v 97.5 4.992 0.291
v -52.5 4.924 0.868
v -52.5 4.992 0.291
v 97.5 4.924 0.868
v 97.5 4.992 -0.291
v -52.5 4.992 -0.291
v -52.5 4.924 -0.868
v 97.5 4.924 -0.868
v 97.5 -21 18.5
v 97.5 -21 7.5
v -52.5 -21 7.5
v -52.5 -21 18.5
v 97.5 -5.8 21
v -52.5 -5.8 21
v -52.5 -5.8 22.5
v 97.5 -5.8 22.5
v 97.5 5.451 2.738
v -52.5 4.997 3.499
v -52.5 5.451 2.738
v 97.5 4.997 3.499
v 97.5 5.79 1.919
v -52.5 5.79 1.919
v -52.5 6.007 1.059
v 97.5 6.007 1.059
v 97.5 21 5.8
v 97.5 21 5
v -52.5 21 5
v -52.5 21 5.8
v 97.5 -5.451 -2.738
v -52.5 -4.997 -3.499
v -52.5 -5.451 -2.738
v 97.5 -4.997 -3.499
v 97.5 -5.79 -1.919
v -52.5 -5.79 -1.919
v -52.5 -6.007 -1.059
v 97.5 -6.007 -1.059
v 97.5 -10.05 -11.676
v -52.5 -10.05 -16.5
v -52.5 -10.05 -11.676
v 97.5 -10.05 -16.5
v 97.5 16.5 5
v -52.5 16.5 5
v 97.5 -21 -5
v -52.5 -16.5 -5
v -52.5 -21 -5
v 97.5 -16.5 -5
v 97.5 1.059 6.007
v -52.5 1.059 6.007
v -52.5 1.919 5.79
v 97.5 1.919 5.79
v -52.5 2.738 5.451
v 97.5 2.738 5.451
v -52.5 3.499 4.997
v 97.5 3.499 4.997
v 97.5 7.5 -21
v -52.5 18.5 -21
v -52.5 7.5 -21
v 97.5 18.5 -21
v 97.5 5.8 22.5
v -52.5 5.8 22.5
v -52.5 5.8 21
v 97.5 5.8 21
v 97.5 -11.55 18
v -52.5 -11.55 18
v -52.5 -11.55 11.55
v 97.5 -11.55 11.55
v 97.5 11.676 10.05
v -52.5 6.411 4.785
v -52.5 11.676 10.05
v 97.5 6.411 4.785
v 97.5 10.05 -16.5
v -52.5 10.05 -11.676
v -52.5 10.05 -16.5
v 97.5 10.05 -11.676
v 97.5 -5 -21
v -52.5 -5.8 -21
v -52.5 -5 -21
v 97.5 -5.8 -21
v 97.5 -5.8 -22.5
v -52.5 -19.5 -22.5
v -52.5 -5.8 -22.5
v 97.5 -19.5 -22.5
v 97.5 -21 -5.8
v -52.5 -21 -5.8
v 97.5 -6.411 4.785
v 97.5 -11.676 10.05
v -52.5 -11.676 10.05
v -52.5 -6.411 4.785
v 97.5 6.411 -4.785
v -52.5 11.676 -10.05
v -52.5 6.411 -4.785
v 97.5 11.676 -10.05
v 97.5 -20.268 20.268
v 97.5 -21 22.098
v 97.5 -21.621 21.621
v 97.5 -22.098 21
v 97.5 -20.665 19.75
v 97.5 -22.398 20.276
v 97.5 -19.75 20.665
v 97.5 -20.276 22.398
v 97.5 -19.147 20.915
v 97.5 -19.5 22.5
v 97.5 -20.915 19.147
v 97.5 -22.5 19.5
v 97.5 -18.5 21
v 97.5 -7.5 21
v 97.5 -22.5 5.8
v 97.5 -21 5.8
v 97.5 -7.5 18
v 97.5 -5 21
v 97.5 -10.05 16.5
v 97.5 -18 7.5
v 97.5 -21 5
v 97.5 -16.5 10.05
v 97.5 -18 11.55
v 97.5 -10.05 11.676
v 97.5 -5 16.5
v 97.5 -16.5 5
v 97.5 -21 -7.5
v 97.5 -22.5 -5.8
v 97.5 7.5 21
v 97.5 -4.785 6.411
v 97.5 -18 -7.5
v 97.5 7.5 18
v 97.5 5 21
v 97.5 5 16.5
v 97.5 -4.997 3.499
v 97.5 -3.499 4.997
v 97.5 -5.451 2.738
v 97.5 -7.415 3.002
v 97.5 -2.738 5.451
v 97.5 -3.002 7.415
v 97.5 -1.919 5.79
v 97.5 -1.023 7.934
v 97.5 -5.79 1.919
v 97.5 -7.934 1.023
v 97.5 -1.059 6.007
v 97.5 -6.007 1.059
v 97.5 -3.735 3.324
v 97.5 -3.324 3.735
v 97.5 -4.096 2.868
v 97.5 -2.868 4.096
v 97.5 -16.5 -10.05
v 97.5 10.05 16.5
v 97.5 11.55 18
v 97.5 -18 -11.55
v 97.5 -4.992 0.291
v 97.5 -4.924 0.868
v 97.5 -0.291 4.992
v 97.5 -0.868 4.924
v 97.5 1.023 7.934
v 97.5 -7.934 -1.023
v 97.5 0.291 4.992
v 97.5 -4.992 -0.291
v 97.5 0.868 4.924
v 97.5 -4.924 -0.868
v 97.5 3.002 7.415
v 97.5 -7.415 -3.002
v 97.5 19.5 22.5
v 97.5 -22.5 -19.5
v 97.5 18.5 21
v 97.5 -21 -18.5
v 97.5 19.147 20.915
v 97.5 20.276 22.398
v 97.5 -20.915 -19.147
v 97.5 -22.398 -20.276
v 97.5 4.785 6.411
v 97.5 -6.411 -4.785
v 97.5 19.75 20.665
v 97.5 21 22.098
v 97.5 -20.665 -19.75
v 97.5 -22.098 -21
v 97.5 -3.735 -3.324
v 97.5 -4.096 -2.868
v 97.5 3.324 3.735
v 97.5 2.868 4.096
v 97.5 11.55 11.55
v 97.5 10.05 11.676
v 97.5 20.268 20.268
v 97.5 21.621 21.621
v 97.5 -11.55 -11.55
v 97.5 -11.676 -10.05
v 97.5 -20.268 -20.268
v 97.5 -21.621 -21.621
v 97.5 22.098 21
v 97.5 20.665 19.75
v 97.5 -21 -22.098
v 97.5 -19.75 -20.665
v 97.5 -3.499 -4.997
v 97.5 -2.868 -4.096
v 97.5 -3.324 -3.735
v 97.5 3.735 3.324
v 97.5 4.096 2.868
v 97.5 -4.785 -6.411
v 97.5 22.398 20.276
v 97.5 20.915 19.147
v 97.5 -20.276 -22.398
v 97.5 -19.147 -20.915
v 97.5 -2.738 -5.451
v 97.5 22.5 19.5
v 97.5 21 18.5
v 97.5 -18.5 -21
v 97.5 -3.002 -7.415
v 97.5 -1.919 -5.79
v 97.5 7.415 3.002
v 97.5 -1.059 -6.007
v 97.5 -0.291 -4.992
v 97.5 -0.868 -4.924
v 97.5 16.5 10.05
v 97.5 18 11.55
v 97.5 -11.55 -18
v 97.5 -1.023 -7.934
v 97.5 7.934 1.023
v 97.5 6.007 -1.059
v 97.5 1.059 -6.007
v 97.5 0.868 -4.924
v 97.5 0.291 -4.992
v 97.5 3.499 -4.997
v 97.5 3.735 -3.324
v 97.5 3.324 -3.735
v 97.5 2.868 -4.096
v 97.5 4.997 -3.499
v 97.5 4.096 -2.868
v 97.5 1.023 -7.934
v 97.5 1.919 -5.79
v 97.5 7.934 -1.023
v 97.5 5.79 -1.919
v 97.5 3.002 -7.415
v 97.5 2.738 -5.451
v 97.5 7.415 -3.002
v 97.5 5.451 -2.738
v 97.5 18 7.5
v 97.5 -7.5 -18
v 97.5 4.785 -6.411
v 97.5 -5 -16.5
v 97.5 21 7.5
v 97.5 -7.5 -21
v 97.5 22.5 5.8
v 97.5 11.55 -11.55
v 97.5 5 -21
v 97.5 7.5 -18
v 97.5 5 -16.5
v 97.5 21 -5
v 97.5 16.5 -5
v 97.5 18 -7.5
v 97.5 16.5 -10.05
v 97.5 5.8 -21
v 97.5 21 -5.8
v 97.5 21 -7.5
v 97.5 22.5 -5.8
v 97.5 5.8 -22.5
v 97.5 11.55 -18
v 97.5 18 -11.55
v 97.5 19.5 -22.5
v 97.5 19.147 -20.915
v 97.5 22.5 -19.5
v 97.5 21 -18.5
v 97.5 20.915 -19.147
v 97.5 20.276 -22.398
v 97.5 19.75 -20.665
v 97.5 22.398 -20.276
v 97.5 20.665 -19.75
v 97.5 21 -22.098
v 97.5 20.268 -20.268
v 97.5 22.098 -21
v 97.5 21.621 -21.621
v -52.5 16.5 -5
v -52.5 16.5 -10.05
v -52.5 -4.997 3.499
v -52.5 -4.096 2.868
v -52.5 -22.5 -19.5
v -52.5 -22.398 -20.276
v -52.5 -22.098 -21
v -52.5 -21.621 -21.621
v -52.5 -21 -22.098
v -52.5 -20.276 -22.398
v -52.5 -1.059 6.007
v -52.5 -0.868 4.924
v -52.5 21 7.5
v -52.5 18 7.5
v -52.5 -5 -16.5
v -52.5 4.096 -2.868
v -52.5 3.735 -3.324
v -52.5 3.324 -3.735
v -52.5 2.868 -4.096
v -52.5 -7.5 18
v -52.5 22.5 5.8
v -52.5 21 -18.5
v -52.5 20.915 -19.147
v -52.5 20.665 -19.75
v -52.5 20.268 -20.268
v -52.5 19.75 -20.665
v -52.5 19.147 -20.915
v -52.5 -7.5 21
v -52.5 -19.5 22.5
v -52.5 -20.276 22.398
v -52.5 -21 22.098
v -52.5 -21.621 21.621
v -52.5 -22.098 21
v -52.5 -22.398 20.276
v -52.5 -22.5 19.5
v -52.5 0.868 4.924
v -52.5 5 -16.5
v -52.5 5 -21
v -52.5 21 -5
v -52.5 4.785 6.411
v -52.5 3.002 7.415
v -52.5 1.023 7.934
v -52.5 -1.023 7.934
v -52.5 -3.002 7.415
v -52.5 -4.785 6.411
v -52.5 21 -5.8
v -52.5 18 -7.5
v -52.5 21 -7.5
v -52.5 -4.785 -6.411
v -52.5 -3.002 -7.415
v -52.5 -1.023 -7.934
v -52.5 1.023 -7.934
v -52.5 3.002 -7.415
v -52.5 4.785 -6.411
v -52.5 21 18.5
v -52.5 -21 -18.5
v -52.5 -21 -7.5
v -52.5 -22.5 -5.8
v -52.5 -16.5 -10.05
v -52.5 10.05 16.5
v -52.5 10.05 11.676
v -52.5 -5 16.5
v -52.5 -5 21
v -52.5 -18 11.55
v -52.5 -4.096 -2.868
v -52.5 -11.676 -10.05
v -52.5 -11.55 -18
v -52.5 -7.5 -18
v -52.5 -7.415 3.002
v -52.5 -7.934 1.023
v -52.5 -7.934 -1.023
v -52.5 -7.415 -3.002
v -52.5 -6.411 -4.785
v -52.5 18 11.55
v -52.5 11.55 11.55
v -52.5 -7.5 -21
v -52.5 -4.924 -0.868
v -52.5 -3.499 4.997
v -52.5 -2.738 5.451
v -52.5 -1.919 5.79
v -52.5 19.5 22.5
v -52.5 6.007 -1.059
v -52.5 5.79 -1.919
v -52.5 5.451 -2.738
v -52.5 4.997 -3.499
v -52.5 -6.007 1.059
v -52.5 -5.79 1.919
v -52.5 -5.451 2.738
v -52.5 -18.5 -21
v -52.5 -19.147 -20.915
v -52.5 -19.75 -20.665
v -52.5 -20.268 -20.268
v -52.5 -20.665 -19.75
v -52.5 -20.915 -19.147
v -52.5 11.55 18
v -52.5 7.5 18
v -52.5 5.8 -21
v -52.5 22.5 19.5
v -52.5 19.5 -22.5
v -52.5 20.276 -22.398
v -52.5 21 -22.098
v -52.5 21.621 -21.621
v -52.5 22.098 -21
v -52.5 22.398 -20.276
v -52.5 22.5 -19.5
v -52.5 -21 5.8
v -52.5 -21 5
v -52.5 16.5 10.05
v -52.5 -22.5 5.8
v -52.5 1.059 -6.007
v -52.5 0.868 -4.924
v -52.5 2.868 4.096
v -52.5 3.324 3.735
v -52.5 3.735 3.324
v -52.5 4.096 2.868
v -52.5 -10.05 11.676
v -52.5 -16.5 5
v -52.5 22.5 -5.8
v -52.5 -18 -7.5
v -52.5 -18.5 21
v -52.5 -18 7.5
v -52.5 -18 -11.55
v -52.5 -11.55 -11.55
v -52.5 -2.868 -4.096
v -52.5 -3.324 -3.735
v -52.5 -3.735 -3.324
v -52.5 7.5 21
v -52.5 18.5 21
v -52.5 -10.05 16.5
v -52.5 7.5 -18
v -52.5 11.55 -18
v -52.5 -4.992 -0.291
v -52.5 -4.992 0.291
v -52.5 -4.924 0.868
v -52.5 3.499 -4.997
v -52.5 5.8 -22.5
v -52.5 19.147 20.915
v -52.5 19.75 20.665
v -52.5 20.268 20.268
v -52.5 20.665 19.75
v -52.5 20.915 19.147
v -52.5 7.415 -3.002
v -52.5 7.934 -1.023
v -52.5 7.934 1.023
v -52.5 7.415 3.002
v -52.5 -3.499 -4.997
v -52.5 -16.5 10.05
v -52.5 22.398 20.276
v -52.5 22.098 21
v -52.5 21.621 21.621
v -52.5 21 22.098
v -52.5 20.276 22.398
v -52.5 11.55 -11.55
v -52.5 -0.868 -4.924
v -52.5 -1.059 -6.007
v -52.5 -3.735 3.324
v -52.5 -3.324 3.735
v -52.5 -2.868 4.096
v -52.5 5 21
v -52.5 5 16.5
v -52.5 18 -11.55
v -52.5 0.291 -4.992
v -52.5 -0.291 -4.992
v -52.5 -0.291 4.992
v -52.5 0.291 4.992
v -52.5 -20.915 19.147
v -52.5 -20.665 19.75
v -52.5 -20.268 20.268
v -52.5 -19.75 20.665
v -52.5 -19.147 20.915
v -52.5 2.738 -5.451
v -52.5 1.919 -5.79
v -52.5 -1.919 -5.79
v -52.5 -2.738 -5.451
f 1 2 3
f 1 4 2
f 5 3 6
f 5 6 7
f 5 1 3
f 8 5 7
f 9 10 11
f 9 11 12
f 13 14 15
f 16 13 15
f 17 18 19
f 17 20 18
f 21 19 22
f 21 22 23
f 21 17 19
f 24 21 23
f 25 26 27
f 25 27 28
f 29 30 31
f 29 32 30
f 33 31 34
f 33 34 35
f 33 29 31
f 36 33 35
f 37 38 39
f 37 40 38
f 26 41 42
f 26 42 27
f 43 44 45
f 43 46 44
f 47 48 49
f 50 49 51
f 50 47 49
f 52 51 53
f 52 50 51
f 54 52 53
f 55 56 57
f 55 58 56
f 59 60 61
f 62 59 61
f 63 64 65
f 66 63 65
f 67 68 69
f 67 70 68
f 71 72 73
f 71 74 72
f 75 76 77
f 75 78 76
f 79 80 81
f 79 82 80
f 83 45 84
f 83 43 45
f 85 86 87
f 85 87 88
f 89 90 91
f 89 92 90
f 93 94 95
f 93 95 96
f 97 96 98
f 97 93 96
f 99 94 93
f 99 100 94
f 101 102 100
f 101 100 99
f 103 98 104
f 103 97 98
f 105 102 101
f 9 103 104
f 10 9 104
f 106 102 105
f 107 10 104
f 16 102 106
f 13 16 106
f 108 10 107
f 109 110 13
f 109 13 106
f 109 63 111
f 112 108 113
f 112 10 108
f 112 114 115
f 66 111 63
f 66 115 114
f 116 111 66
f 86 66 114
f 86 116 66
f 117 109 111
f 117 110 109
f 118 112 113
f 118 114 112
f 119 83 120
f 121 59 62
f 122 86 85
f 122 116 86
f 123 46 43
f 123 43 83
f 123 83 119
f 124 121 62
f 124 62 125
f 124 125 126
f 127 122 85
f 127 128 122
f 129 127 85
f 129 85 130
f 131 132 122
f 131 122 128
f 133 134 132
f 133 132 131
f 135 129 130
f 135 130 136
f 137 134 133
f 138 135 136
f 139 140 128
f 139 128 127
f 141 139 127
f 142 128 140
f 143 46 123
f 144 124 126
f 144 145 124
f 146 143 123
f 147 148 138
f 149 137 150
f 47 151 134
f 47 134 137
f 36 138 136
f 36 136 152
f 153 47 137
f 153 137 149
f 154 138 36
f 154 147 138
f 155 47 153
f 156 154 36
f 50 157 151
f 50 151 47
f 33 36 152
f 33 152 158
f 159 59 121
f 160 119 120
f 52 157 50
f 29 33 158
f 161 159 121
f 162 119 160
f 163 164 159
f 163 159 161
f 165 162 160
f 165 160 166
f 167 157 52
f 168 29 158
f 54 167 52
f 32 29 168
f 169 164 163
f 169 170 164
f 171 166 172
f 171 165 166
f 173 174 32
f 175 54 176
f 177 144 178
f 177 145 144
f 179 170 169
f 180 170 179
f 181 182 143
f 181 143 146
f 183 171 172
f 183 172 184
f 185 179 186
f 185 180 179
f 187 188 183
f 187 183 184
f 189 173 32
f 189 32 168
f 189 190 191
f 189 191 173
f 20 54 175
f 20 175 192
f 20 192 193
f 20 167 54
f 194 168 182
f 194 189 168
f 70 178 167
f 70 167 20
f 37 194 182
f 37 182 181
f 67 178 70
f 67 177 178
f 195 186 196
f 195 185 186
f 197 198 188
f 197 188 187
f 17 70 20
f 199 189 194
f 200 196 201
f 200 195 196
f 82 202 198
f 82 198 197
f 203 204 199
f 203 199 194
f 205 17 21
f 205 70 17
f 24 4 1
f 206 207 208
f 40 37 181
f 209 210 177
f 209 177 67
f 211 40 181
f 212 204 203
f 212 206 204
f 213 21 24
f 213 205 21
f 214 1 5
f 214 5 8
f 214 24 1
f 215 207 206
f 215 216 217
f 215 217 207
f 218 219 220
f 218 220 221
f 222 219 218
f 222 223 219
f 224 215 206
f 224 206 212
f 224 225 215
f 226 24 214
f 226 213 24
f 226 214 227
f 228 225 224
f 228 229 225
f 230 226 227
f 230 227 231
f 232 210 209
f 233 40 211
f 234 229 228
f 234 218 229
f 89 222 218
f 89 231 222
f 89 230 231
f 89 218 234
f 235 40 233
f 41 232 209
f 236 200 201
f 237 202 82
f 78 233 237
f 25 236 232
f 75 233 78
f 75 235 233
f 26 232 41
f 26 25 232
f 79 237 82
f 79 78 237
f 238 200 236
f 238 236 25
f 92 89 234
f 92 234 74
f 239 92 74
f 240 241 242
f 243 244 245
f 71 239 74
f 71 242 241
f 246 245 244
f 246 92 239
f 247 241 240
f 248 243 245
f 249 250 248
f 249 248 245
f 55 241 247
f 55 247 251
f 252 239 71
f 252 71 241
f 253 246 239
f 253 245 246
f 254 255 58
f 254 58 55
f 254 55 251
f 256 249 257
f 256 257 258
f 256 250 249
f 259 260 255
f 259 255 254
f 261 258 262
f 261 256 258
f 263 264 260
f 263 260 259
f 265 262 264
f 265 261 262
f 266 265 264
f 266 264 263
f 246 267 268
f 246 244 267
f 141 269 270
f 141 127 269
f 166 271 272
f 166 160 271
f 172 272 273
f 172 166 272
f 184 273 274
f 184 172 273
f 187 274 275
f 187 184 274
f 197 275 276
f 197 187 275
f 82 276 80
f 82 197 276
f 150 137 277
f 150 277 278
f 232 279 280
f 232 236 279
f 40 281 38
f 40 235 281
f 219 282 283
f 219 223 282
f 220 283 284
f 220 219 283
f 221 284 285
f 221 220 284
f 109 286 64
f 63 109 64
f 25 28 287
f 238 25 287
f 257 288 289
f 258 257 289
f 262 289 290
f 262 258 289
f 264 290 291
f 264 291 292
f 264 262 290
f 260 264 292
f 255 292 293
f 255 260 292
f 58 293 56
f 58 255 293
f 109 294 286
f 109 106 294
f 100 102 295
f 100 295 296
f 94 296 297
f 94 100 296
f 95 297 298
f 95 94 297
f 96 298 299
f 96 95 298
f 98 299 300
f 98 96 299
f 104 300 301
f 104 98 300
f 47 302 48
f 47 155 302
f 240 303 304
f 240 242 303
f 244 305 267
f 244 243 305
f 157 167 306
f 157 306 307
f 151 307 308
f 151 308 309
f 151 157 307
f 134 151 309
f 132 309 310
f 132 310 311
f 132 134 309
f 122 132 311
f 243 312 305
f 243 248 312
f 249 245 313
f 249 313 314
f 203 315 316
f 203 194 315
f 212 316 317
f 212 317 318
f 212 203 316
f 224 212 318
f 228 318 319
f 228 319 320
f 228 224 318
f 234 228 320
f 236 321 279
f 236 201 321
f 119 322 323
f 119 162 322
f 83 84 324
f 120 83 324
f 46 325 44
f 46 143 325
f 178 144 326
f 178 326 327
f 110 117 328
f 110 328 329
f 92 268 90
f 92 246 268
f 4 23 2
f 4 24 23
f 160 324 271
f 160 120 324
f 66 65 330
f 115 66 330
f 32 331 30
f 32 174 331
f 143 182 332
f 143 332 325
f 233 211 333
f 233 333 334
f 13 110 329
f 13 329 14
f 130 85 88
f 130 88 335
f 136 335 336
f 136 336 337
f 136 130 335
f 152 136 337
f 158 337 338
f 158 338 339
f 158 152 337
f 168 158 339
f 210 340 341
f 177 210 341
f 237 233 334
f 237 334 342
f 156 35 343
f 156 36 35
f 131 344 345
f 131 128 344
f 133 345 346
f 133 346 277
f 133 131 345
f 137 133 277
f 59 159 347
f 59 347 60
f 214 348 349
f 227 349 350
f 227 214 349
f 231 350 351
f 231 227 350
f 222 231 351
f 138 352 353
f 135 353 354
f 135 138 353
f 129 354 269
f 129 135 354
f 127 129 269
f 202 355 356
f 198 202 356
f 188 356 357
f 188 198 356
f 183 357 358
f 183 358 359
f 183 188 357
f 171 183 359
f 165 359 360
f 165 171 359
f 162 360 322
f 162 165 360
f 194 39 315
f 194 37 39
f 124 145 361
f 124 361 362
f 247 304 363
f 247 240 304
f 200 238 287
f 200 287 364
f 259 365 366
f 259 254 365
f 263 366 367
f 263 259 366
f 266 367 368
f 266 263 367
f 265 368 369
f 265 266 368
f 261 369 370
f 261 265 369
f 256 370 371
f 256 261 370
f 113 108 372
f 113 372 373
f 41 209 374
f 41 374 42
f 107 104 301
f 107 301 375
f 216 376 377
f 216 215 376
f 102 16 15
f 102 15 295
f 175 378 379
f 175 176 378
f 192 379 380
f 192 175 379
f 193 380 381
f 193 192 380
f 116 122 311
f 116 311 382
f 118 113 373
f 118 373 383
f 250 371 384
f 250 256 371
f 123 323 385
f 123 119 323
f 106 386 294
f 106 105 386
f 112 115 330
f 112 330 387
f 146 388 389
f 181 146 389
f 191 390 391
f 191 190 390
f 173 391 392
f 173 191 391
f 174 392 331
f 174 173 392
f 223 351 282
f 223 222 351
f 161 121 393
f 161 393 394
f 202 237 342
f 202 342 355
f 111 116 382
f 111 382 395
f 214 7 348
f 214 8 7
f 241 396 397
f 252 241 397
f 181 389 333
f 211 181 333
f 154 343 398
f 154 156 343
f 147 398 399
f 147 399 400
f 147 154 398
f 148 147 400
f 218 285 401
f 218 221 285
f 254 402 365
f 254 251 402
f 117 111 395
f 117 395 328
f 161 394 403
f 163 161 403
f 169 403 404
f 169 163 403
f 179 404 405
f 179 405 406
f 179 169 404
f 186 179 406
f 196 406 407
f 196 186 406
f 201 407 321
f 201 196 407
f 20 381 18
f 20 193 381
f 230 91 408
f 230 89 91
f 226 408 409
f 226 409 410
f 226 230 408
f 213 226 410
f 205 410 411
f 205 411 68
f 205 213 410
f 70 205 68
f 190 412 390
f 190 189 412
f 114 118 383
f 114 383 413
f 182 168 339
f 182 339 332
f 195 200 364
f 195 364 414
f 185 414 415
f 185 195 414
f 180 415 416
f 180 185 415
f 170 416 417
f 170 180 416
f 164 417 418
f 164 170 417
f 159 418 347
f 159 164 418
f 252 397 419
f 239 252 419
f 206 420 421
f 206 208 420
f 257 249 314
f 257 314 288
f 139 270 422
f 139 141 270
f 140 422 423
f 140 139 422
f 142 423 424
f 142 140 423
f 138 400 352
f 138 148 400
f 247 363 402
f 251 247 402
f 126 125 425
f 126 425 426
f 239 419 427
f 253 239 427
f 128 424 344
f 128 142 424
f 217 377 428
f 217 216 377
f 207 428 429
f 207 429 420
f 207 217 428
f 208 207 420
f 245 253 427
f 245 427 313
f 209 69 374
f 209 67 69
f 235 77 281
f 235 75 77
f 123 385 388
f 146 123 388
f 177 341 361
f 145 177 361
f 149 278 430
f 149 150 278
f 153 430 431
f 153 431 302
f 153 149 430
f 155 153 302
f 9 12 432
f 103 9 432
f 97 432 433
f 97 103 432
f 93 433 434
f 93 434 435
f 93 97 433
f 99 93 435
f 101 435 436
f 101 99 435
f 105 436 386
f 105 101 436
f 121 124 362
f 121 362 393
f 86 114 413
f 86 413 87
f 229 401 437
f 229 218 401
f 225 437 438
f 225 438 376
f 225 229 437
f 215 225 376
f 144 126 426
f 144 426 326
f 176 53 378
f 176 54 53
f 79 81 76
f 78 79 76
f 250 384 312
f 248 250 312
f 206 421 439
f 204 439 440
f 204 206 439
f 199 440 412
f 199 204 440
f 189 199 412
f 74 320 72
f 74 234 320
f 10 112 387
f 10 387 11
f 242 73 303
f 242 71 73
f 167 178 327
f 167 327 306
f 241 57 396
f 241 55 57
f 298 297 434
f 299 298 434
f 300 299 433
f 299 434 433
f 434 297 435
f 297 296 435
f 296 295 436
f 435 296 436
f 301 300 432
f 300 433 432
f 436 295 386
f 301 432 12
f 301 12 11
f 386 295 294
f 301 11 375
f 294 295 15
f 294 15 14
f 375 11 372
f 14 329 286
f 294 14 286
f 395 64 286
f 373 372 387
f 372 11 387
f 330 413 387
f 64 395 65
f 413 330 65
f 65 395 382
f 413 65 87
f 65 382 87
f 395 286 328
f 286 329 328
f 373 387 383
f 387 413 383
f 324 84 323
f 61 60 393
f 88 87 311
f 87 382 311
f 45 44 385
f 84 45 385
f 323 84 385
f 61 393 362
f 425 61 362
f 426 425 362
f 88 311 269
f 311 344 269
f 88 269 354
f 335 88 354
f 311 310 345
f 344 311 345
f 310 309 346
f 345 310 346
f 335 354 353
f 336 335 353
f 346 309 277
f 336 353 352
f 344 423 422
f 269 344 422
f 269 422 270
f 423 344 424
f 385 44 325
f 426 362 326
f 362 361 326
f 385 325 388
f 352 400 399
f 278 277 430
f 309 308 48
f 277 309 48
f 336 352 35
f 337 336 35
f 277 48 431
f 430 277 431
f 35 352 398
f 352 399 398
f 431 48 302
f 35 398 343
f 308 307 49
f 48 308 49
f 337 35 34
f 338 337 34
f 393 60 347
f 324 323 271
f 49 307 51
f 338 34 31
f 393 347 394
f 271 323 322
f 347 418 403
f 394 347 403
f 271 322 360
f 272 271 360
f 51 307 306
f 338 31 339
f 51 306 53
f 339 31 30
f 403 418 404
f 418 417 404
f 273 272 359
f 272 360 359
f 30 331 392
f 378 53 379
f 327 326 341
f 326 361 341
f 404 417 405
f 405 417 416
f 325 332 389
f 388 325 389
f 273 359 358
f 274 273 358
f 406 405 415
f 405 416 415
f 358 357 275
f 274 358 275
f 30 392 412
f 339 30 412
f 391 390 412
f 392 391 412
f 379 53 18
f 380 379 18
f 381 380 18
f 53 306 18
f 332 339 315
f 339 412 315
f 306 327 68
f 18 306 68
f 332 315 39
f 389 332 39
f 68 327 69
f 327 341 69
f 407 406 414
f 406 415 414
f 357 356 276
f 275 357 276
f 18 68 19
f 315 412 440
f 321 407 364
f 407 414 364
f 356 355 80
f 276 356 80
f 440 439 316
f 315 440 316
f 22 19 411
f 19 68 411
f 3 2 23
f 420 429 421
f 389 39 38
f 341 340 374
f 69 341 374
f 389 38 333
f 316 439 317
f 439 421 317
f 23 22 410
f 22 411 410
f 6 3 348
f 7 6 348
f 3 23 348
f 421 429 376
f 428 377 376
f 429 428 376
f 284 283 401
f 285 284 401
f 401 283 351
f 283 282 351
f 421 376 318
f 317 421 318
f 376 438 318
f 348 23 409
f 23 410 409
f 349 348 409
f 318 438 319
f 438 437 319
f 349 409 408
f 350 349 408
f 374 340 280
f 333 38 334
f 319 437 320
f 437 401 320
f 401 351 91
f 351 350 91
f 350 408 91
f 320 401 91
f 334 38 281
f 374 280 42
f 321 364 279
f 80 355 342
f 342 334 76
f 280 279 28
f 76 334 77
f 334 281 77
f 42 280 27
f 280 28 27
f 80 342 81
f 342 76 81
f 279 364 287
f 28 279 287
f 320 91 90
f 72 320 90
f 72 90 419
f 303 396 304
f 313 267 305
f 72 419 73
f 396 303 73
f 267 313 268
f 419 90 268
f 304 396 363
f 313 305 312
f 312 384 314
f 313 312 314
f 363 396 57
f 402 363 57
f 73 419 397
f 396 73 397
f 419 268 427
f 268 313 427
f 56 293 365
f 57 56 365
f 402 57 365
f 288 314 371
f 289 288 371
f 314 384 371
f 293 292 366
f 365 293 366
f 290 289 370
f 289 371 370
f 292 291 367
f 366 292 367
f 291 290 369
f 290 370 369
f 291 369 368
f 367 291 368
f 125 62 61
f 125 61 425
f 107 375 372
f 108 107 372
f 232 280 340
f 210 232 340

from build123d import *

# Parameters (mm, degrees)
BR_EXTRUDE_DEPTH      = 97.5
BR_EXTRUDE_DEPTH_BACK = 52.5


with BuildPart() as part:
    # Sketch2 → BR_Extrude (new body, two sides)
    with BuildSketch(Plane(origin=(0, 0, 0), x_dir=(0, 0, -1), z_dir=(1, 0, 0))) as br_extrude_sk:
        with BuildLine():
            Line((-10.05, 11.676345597), (-10.05, 16.5))
            Line((-10.05, 16.5), (-5, 16.5))
            Line((-5, 16.5), (-5, 21))
            Line((-5, 21), (-5.8, 21))
            Line((-5.8, 21), (-5.8, 22.5))
            Line((-5.8, 22.5), (-19.5, 22.5))
            ThreePointArc((-19.5, 22.5), (-21.621320344, 21.621320344), (-22.5, 19.5))
            Line((-22.5, 19.5), (-22.5, 5.8))
            Line((-22.5, 5.8), (-21, 5.8))
            Line((-21, 5.8), (-21, 5))
            Line((-21, 5), (-16.5, 5))
            Line((-16.5, 5), (-16.5, 10.05))
            Line((-16.5, 10.05), (-11.676345597, 10.05))
            Line((-11.676345597, 10.05), (-6.411275155, 4.784929559))
            ThreePointArc((-6.411275155, 4.784929559), (-8, 0), (-6.411275155, -4.784929559))
            Line((-6.411275155, -4.784929559), (-11.676345597, -10.05))
            Line((-11.676345597, -10.05), (-16.5, -10.05))
            Line((-16.5, -10.05), (-16.5, -5))
            Line((-16.5, -5), (-21, -5))
            Line((-21, -5), (-21, -5.8))
            Line((-21, -5.8), (-22.5, -5.8))
            Line((-22.5, -5.8), (-22.5, -19.5))
            ThreePointArc((-22.5, -19.5), (-21.621320344, -21.621320344), (-19.5, -22.5))
            Line((-19.5, -22.5), (-5.8, -22.5))
            Line((-5.8, -22.5), (-5.8, -21))
            Line((-5.8, -21), (-5, -21))
            Line((-5, -21), (-5, -16.5))
            Line((-5, -16.5), (-10.05, -16.5))
            Line((-10.05, -16.5), (-10.05, -11.676345597))
            Line((-10.05, -11.676345597), (-4.784929559, -6.411275155))
            ThreePointArc((-4.784929559, -6.411275155), (0, -8), (4.784929559, -6.411275155))
            Line((4.784929559, -6.411275155), (10.05, -11.676345597))
            Line((10.05, -11.676345597), (10.05, -16.5))
            Line((10.05, -16.5), (5, -16.5))
            Line((5, -16.5), (5, -21))
            Line((5, -21), (5.8, -21))
            Line((5.8, -21), (5.8, -22.5))
            Line((5.8, -22.5), (19.5, -22.5))
            ThreePointArc((19.5, -22.5), (21.621320344, -21.621320344), (22.5, -19.5))
            Line((22.5, -19.5), (22.5, -5.8))
            Line((22.5, -5.8), (21, -5.8))
            Line((21, -5.8), (21, -5))
            Line((21, -5), (16.5, -5))
            Line((16.5, -5), (16.5, -10.05))
            Line((16.5, -10.05), (11.676345597, -10.05))
            Line((11.676345597, -10.05), (6.411275155, -4.784929559))
            ThreePointArc((6.411275155, -4.784929559), (8, 0), (6.411275155, 4.784929559))
            Line((6.411275155, 4.784929559), (11.676345597, 10.05))
            Line((11.676345597, 10.05), (16.5, 10.05))
            Line((16.5, 10.05), (16.5, 5))
            Line((16.5, 5), (21, 5))
            Line((21, 5), (21, 5.8))
            Line((21, 5.8), (22.5, 5.8))
            Line((22.5, 5.8), (22.5, 19.5))
            ThreePointArc((22.5, 19.5), (21.621320344, 21.621320344), (19.5, 22.5))
            Line((19.5, 22.5), (5.8, 22.5))
            Line((5.8, 22.5), (5.8, 21))
            Line((5.8, 21), (5, 21))
            Line((5, 21), (5, 16.5))
            Line((5, 16.5), (10.05, 16.5))
            Line((10.05, 16.5), (10.05, 11.676345597))
            Line((10.05, 11.676345597), (4.784929559, 6.411275155))
            ThreePointArc((4.784929559, 6.411275155), (0, 8), (-4.784929559, 6.411275155))
            Line((-4.784929559, 6.411275155), (-10.05, 11.676345597))
        make_face()
        with BuildLine():
            Line((11.55, 11.55), (11.55, 18))
            Line((11.55, 18), (7.5, 18))
            Line((7.5, 18), (7.5, 21))
            Line((7.5, 21), (18.5, 21))
            ThreePointArc((18.5, 21), (20.267766953, 20.267766953), (21, 18.5))
            Line((21, 18.5), (21, 7.5))
            Line((21, 7.5), (18, 7.5))
            Line((18, 7.5), (18, 11.55))
            Line((18, 11.55), (11.55, 11.55))
        make_face(mode=Mode.SUBTRACT)
        with BuildLine():
            Line((11.55, -11.55), (18, -11.55))
            Line((18, -11.55), (18, -7.5))
            Line((18, -7.5), (21, -7.5))
            Line((21, -7.5), (21, -18.5))
            ThreePointArc((21, -18.5), (20.267766953, -20.267766953), (18.5, -21))
            Line((18.5, -21), (7.5, -21))
            Line((7.5, -21), (7.5, -18))
            Line((7.5, -18), (11.55, -18))
            Line((11.55, -18), (11.55, -11.55))
        make_face(mode=Mode.SUBTRACT)
        with BuildLine():
            Line((-11.55, 11.55), (-18, 11.55))
            Line((-18, 11.55), (-18, 7.5))
            Line((-18, 7.5), (-21, 7.5))
            Line((-21, 7.5), (-21, 18.5))
            ThreePointArc((-21, 18.5), (-20.267766953, 20.267766953), (-18.5, 21))
            Line((-18.5, 21), (-7.5, 21))
            Line((-7.5, 21), (-7.5, 18))
            Line((-7.5, 18), (-11.55, 18))
            Line((-11.55, 18), (-11.55, 11.55))
        make_face(mode=Mode.SUBTRACT)
        with BuildLine():
            Line((-11.55, -11.55), (-11.55, -18))
            Line((-11.55, -18), (-7.5, -18))
            Line((-7.5, -18), (-7.5, -21))
            Line((-7.5, -21), (-18.5, -21))
            ThreePointArc((-18.5, -21), (-20.267766953, -20.267766953), (-21, -18.5))
            Line((-21, -18.5), (-21, -7.5))
            Line((-21, -7.5), (-18, -7.5))
            Line((-18, -7.5), (-18, -11.55))
            Line((-18, -11.55), (-11.55, -11.55))
        make_face(mode=Mode.SUBTRACT)
        with BuildLine():
            Line((-6.007327293, -1.059253884), (-4.924038765, -0.868240888))
            ThreePointArc((-4.924038765, -0.868240888), (-5, 0), (-4.924038765, 0.868240888))
            Line((-4.924038765, 0.868240888), (-6.007327293, 1.059253884))
            ThreePointArc((-6.007327293, 1.059253884), (-5.635665148, 2.334368937), (-4.99682747, 3.498816262))
            Line((-4.99682747, 3.498816262), (-4.095760221, 2.867882182))
            ThreePointArc((-4.095760221, 2.867882182), (-3.535533906, 3.535533906), (-2.867882182, 4.095760221))
            Line((-2.867882182, 4.095760221), (-3.498816262, 4.99682747))
            ThreePointArc((-3.498816262, 4.99682747), (-2.334368937, 5.635665148), (-1.059253884, 6.007327293))
            Line((-1.059253884, 6.007327293), (-0.868240888, 4.924038765))
            ThreePointArc((-0.868240888, 4.924038765), (0, 5), (0.868240888, 4.924038765))
            Line((0.868240888, 4.924038765), (1.059253884, 6.007327293))
            ThreePointArc((1.059253884, 6.007327293), (2.334368937, 5.635665148), (3.498816262, 4.99682747))
            Line((3.498816262, 4.99682747), (2.867882182, 4.095760221))
            ThreePointArc((2.867882182, 4.095760221), (3.535533906, 3.535533906), (4.095760221, 2.867882182))
            Line((4.095760221, 2.867882182), (4.99682747, 3.498816262))
            ThreePointArc((4.99682747, 3.498816262), (5.635665148, 2.334368937), (6.007327293, 1.059253884))
            Line((6.007327293, 1.059253884), (4.924038765, 0.868240888))
            ThreePointArc((4.924038765, 0.868240888), (5, 0), (4.924038765, -0.868240888))
            Line((4.924038765, -0.868240888), (6.007327293, -1.059253884))
            ThreePointArc((6.007327293, -1.059253884), (5.635665148, -2.334368937), (4.99682747, -3.498816262))
            Line((4.99682747, -3.498816262), (4.095760221, -2.867882182))
            ThreePointArc((4.095760221, -2.867882182), (3.535533906, -3.535533906), (2.867882182, -4.095760221))
            Line((2.867882182, -4.095760221), (3.498816262, -4.99682747))
            ThreePointArc((3.498816262, -4.99682747), (2.334368937, -5.635665148), (1.059253884, -6.007327293))
            Line((1.059253884, -6.007327293), (0.868240888, -4.924038765))
            ThreePointArc((0.868240888, -4.924038765), (0, -5), (-0.868240888, -4.924038765))
            Line((-0.868240888, -4.924038765), (-1.059253884, -6.007327293))
            ThreePointArc((-1.059253884, -6.007327293), (-2.334368937, -5.635665148), (-3.498816262, -4.99682747))
            Line((-3.498816262, -4.99682747), (-2.867882182, -4.095760221))
            ThreePointArc((-2.867882182, -4.095760221), (-3.535533906, -3.535533906), (-4.095760221, -2.867882182))
            Line((-4.095760221, -2.867882182), (-4.99682747, -3.498816262))
            ThreePointArc((-4.99682747, -3.498816262), (-5.635665148, -2.334368937), (-6.007327293, -1.059253884))
        make_face(mode=Mode.SUBTRACT)
    extrude(amount=BR_EXTRUDE_DEPTH)
    extrude(br_extrude_sk.sketch, amount=-BR_EXTRUDE_DEPTH_BACK)


solid = part.part
